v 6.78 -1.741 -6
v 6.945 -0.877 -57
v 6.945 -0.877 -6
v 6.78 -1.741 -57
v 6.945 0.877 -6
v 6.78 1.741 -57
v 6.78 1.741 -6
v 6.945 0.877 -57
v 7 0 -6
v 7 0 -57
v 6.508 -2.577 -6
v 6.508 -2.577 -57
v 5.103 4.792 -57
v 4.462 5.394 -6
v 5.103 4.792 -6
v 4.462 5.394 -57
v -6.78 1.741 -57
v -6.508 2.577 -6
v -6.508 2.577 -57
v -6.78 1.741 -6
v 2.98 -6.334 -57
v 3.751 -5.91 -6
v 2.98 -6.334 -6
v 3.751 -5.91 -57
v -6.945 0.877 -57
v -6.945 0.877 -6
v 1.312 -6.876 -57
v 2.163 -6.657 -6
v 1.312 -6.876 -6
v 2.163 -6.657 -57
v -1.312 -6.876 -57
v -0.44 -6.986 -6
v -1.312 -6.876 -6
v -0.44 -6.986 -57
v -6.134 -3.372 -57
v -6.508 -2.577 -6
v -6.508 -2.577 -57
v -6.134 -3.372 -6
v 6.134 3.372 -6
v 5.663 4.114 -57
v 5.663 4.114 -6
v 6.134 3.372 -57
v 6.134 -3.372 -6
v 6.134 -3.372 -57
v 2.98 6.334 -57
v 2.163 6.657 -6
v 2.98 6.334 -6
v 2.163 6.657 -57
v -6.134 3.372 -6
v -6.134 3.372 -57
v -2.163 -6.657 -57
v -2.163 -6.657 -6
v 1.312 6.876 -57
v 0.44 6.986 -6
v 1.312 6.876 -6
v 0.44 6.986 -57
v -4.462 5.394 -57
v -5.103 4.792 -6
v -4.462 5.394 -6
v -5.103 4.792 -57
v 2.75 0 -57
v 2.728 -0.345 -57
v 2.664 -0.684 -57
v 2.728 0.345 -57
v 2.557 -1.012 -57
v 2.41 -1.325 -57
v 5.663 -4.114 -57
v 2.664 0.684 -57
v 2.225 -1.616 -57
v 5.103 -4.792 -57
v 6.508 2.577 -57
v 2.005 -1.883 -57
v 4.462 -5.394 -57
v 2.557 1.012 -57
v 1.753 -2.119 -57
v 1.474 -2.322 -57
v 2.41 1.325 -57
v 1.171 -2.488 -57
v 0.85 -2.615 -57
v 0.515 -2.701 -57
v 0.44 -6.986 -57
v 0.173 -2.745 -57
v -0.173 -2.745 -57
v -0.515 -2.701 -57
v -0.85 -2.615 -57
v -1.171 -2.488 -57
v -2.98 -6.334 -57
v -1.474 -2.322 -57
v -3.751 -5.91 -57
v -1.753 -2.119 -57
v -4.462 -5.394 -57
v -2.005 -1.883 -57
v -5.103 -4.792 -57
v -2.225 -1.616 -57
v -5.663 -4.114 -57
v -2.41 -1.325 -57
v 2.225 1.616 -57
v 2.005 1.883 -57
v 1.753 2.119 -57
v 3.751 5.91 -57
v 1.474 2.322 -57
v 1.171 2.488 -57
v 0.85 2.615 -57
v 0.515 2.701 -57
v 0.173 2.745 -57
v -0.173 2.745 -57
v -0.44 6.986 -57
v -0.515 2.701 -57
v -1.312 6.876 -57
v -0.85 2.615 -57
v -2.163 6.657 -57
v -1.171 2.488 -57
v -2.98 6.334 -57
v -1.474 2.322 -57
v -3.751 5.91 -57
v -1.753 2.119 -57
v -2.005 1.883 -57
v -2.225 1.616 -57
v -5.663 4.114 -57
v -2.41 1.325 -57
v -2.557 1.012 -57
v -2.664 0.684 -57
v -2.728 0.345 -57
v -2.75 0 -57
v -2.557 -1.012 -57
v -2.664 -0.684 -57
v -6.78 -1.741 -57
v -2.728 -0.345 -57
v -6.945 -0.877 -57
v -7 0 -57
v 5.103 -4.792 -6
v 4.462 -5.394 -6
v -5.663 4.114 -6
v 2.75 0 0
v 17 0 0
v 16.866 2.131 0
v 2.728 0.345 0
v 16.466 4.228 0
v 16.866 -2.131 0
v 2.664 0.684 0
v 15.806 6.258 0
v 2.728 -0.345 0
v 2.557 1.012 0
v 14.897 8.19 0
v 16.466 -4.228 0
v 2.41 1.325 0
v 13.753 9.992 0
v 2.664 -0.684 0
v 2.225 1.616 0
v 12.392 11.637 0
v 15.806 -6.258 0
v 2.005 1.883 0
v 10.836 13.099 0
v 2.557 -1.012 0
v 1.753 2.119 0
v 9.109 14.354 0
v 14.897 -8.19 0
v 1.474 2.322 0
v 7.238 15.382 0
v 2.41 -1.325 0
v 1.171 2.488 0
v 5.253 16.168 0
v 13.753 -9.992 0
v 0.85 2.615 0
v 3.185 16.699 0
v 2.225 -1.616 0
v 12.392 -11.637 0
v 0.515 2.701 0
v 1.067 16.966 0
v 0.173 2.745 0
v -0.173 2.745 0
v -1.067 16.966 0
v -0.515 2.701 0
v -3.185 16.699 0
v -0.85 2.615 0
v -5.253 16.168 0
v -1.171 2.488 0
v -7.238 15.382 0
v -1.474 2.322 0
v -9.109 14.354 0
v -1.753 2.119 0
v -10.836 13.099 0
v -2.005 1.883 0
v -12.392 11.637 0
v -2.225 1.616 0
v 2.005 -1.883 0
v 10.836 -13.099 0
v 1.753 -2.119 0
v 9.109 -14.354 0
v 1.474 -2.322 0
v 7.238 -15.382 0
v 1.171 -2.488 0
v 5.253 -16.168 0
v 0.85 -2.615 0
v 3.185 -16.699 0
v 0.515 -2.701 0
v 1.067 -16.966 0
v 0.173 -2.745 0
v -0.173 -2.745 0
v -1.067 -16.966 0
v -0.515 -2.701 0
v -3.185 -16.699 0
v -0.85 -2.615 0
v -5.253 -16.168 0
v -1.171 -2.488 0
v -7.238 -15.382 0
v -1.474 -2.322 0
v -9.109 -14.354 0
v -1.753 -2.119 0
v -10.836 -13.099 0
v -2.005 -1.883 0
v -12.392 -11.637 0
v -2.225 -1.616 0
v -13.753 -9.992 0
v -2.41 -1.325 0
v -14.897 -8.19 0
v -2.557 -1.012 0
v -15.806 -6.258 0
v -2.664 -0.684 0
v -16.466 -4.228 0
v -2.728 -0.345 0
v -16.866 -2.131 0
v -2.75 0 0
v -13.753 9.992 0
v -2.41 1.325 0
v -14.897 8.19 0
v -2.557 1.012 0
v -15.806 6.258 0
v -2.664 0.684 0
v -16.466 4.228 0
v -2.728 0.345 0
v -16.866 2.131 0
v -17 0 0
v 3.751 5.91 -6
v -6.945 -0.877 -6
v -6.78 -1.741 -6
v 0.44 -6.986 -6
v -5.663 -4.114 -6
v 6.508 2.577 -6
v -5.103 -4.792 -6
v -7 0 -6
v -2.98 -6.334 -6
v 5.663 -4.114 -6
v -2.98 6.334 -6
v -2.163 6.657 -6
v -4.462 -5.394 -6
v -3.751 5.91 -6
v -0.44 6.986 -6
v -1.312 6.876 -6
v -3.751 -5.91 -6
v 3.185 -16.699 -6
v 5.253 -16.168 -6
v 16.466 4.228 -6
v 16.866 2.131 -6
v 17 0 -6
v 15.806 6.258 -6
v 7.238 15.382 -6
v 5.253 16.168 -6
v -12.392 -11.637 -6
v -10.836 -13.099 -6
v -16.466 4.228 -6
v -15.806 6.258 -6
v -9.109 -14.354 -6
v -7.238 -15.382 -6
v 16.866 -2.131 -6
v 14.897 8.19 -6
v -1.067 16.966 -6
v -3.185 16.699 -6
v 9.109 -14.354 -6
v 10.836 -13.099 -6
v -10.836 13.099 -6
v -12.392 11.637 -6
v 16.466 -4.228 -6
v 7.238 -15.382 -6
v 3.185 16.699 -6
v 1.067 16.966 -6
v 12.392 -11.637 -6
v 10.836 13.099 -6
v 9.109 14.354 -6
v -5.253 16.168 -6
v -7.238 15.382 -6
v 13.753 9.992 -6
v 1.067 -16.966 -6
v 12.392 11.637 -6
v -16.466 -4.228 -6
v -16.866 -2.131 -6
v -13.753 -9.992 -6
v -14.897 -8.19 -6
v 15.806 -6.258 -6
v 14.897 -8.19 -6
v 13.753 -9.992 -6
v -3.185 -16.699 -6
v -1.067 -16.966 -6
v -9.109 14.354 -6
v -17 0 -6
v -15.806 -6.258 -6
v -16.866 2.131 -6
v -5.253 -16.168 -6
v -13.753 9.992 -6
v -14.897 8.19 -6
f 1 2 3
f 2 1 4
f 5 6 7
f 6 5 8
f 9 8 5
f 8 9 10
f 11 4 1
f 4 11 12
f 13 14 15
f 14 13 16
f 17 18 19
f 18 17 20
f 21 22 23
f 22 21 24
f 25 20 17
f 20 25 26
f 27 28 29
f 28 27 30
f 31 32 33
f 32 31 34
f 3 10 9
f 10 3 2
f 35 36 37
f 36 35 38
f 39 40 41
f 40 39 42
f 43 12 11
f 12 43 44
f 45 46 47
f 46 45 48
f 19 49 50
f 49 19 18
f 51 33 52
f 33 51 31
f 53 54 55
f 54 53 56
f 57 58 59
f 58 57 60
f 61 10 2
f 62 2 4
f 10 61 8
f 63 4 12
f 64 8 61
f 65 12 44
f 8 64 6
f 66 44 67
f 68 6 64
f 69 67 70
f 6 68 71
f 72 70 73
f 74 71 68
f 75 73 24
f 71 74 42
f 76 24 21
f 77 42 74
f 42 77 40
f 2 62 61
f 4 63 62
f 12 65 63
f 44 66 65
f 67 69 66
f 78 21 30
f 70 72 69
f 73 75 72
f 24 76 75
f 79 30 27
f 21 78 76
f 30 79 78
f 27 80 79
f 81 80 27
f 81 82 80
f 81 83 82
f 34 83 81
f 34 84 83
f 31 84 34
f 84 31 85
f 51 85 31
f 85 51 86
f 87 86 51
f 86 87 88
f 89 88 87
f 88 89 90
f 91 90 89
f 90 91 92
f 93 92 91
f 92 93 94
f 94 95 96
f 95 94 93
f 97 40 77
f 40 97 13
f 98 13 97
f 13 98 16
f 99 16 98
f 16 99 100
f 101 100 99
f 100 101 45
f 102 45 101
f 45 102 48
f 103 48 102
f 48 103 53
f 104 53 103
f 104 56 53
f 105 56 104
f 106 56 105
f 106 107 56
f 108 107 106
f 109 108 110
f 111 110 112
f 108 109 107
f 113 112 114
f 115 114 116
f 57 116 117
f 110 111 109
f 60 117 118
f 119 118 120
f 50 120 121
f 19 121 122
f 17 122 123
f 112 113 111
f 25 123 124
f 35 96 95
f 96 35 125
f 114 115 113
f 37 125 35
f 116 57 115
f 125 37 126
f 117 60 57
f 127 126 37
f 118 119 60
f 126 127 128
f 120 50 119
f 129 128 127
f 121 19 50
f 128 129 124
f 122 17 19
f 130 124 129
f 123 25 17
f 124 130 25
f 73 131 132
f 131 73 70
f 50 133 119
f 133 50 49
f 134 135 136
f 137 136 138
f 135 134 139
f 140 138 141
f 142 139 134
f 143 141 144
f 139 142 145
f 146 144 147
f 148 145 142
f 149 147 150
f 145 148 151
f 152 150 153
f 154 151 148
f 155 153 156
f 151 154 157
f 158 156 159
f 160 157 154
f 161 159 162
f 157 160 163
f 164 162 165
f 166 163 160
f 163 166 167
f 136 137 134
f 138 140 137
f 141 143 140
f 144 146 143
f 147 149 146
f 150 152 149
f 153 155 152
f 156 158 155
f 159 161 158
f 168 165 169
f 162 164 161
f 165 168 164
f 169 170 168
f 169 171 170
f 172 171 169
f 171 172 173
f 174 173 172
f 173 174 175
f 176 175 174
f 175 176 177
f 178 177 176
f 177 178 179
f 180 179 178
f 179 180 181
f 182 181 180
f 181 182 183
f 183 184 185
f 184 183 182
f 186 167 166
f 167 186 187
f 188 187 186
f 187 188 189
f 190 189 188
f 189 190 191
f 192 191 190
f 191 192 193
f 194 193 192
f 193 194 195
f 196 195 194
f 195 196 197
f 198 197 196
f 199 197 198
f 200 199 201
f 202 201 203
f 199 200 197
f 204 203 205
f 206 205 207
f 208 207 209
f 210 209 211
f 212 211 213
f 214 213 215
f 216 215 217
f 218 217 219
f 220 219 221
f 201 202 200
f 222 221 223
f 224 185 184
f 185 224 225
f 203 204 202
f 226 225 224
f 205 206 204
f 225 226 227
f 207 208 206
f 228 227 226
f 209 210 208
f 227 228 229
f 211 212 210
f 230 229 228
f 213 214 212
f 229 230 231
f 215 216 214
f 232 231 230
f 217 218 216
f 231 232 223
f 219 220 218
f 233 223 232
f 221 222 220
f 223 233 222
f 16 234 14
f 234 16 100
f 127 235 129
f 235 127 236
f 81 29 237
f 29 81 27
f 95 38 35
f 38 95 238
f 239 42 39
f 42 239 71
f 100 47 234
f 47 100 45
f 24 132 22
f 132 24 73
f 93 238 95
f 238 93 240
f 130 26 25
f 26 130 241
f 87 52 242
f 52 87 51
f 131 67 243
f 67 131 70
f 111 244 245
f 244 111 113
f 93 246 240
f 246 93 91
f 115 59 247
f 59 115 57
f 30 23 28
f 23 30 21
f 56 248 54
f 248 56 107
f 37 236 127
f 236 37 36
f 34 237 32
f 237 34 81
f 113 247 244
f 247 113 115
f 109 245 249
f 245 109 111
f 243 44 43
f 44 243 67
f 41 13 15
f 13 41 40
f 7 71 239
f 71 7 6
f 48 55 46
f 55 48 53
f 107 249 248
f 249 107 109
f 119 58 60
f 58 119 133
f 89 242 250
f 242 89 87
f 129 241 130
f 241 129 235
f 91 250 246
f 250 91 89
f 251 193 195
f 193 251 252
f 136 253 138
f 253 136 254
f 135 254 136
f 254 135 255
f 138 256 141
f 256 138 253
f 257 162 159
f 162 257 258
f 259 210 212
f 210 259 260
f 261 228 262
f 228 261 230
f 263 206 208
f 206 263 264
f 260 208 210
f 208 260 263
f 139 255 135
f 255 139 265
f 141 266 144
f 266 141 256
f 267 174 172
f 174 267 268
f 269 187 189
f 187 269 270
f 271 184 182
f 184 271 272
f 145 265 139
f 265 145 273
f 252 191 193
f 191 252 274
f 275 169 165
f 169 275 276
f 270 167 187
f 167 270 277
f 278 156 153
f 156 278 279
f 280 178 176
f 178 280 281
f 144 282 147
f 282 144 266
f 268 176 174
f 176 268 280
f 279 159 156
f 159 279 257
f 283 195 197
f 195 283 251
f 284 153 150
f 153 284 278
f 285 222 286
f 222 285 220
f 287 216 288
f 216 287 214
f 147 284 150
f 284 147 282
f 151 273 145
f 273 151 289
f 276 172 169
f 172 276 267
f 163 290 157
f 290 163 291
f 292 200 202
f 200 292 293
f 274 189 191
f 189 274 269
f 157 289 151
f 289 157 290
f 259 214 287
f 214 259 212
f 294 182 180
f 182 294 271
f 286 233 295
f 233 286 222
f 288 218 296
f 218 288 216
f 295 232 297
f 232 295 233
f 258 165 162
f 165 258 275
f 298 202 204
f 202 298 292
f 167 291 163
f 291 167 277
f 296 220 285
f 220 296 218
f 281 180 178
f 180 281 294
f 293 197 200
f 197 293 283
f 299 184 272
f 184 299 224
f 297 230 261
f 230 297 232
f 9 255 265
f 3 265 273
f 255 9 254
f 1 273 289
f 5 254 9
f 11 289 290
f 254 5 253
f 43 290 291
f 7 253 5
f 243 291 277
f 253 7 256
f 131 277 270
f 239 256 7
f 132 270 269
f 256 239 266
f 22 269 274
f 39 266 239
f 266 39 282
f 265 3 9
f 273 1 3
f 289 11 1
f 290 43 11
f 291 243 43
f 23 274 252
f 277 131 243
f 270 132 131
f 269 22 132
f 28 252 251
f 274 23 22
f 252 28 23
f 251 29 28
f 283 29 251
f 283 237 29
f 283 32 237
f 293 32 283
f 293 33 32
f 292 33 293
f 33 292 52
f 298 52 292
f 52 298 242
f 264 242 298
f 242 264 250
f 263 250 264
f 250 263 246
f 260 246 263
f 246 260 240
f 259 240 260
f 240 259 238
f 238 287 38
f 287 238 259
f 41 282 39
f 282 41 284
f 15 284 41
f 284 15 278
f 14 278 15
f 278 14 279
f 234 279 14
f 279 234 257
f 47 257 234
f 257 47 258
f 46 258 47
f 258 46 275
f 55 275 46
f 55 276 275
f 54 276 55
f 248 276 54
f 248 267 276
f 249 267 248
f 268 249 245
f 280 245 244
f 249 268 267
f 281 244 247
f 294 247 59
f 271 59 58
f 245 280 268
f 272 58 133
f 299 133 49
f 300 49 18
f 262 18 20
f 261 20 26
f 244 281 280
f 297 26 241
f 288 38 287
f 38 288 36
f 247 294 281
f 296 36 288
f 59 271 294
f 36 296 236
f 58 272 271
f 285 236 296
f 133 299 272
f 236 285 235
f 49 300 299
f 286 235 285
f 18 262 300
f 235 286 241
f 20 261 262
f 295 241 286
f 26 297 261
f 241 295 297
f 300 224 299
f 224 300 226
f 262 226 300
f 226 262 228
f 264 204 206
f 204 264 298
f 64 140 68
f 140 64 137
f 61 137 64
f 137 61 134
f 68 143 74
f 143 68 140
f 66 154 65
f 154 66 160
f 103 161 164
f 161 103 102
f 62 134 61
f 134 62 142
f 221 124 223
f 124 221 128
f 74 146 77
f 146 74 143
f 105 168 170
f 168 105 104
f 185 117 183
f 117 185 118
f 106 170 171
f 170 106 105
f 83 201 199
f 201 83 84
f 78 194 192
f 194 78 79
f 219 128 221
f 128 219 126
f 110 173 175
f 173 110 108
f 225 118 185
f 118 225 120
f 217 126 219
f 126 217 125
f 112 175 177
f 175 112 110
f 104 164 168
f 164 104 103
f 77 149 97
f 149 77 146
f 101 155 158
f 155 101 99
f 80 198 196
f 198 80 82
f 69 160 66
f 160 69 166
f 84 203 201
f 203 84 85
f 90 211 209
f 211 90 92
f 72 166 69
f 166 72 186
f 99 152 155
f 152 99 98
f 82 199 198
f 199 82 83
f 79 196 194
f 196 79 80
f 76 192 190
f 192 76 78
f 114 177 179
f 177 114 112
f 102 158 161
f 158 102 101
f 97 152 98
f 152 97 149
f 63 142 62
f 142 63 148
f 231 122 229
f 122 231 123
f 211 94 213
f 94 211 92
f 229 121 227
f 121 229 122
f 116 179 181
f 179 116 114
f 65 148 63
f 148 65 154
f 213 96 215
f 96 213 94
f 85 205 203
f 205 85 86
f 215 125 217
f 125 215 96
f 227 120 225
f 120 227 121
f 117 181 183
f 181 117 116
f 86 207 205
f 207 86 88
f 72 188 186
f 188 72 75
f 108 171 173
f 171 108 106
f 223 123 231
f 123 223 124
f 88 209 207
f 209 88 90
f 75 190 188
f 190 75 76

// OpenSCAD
$fn = 50;


difference() {
	union() {
		translate(v = [0, 0, -57.0000000000]) {
			cylinder(h = 57, r = 7.0000000000);
		}
		translate(v = [0, 0, -6.0000000000]) {
			cylinder(h = 6, r = 17.0000000000);
		}
	}
	union() {
		#translate(v = [0, 0, -57]) {
			cylinder(h = 57, r = 2.7500000000);
		}
	}
}
